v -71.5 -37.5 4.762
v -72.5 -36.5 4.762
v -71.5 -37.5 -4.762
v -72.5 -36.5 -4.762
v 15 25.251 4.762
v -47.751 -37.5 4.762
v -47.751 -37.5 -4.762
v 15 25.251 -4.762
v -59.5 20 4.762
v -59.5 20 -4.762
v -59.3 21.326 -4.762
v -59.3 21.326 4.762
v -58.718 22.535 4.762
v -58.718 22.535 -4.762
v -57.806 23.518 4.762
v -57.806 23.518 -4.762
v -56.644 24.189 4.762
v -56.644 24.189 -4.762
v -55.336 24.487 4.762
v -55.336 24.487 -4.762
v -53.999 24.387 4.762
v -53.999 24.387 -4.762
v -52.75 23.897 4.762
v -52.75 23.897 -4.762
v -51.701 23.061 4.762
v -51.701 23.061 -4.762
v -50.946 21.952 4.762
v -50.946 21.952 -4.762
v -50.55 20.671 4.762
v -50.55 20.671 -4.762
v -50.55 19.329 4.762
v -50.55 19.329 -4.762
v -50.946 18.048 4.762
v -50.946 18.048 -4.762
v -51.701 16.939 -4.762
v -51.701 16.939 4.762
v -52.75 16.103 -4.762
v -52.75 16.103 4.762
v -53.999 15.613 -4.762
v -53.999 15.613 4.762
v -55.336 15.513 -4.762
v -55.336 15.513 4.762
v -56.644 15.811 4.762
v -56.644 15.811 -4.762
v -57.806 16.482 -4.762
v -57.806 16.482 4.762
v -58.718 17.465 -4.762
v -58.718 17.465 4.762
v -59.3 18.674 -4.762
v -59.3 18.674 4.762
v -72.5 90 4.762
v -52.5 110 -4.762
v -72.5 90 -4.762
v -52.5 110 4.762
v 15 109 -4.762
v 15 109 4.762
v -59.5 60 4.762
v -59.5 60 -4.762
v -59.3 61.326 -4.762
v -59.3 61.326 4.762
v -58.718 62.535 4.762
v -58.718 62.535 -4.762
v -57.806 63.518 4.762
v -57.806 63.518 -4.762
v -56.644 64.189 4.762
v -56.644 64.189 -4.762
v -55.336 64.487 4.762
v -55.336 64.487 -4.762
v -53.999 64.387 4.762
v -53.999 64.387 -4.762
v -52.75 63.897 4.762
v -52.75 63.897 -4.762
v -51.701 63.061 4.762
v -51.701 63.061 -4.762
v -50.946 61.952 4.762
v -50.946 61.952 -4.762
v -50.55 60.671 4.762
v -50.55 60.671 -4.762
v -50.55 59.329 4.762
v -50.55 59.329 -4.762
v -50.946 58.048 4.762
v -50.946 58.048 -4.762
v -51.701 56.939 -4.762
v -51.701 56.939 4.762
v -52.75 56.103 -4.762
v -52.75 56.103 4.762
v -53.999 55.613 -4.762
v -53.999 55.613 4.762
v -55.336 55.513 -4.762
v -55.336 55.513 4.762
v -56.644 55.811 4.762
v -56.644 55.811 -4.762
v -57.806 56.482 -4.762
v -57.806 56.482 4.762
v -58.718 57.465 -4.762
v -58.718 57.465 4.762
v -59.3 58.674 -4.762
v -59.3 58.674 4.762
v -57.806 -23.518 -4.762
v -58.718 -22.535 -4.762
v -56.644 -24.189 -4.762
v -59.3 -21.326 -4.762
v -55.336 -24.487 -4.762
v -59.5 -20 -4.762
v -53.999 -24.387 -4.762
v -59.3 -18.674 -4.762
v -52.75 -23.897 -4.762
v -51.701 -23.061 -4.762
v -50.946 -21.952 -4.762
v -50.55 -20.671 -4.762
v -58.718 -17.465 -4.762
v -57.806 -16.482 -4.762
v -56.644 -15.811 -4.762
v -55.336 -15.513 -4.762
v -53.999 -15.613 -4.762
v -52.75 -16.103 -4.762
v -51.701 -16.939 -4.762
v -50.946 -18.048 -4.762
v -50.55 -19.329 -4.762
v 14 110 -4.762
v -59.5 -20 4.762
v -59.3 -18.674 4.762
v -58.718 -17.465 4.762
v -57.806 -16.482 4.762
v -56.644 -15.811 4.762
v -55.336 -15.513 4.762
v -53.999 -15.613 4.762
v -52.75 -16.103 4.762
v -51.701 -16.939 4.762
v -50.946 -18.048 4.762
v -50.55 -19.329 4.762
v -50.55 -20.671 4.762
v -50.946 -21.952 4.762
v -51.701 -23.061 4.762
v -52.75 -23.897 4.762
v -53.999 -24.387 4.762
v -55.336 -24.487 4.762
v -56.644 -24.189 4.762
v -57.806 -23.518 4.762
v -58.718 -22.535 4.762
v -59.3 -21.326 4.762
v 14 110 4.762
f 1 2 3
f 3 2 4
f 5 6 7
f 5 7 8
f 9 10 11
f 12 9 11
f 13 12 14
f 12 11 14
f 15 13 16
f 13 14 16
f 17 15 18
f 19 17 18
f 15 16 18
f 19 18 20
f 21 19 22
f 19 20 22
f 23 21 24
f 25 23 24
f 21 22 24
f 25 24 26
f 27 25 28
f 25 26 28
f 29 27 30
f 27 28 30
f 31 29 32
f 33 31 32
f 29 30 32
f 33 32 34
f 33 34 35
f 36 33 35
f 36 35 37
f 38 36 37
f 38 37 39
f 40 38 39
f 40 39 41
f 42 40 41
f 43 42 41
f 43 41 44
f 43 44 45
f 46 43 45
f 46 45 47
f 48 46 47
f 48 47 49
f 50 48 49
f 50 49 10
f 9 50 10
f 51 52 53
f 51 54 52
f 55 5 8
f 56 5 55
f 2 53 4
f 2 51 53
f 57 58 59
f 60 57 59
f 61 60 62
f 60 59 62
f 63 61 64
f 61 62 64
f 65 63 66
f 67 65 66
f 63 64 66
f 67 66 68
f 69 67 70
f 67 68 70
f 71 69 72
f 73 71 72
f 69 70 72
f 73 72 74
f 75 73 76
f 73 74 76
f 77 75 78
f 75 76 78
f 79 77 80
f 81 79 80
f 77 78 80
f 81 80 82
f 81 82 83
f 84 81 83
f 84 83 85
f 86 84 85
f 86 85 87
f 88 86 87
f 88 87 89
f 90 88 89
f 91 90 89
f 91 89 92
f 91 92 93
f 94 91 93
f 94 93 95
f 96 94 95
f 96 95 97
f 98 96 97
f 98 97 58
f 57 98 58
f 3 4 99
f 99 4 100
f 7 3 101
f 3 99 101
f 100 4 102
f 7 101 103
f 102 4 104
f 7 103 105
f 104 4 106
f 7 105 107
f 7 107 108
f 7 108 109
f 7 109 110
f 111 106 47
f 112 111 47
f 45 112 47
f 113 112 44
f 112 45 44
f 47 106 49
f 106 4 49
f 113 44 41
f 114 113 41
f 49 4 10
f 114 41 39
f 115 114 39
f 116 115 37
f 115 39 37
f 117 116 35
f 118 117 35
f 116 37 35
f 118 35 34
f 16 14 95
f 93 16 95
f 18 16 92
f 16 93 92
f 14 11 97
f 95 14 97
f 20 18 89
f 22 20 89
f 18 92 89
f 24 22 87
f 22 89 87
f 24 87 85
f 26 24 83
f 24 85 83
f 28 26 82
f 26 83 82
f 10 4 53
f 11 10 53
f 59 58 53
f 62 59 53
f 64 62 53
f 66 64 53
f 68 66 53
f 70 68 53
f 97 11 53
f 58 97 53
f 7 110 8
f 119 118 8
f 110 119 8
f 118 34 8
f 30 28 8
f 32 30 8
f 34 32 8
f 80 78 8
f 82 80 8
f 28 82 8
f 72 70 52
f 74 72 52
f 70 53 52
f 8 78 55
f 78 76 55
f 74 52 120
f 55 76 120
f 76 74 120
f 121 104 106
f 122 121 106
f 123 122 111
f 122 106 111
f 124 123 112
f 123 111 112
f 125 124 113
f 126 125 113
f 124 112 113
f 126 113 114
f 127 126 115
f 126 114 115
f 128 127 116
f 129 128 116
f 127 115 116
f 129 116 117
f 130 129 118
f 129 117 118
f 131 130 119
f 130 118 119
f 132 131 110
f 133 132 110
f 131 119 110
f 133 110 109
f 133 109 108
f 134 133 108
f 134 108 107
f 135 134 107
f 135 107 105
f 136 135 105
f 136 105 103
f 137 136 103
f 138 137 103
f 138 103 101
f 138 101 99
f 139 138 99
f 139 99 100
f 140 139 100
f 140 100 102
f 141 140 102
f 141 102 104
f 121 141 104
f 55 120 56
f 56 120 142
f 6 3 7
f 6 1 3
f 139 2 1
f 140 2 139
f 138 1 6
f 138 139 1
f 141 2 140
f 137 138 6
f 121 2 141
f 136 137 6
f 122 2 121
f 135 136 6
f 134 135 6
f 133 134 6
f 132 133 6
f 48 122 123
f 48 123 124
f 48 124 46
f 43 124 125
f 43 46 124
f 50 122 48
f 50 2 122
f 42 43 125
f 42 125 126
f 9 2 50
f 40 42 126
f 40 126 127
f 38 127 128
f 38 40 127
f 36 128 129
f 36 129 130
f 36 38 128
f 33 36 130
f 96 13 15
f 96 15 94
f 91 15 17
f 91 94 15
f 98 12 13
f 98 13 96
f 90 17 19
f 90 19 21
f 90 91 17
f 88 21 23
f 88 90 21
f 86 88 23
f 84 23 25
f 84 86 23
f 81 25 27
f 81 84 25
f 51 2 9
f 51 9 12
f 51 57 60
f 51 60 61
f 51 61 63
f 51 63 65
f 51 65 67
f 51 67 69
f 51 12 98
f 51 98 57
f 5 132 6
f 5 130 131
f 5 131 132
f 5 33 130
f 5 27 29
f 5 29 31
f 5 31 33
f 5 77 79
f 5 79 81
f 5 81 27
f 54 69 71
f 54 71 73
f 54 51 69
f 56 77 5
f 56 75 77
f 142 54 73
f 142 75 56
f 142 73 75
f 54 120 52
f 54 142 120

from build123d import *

# Parameters (mm, degrees)
BOSS_EXTRUDE1_DEPTH  = 4.7625
M8_CLEARANCE_HOLE1_D = 9
CHAMFER1_SIZE        = 1


with BuildPart() as part:
    # Sketch1 → Boss-Extrude1 (new, symmetric)
    with BuildSketch(Plane.XY):
        Polygon((-72.5, -37.5), (-47.751262658, -37.5), (15, 25.251262658), (15, 110), (-52.5, 110), (-72.5, 90), align=None)
    extrude(amount=BOSS_EXTRUDE1_DEPTH, both=True)

    # M8 Clearance Hole1 (through all)
    with Locations(Plane.XY.offset(4.7625)):
        with Locations((-55, 60), (-55, 20), (-55, -20)):
            Hole(M8_CLEARANCE_HOLE1_D / 2)

    # Chamfer1
    chamfer1_edges = [part.edges().sort_by_distance(p)[0] for p in [
        (15, 110, 0),
        (-72.5, -37.5, 0),
    ]]
    chamfer(chamfer1_edges, length=CHAMFER1_SIZE)


solid = part.part
